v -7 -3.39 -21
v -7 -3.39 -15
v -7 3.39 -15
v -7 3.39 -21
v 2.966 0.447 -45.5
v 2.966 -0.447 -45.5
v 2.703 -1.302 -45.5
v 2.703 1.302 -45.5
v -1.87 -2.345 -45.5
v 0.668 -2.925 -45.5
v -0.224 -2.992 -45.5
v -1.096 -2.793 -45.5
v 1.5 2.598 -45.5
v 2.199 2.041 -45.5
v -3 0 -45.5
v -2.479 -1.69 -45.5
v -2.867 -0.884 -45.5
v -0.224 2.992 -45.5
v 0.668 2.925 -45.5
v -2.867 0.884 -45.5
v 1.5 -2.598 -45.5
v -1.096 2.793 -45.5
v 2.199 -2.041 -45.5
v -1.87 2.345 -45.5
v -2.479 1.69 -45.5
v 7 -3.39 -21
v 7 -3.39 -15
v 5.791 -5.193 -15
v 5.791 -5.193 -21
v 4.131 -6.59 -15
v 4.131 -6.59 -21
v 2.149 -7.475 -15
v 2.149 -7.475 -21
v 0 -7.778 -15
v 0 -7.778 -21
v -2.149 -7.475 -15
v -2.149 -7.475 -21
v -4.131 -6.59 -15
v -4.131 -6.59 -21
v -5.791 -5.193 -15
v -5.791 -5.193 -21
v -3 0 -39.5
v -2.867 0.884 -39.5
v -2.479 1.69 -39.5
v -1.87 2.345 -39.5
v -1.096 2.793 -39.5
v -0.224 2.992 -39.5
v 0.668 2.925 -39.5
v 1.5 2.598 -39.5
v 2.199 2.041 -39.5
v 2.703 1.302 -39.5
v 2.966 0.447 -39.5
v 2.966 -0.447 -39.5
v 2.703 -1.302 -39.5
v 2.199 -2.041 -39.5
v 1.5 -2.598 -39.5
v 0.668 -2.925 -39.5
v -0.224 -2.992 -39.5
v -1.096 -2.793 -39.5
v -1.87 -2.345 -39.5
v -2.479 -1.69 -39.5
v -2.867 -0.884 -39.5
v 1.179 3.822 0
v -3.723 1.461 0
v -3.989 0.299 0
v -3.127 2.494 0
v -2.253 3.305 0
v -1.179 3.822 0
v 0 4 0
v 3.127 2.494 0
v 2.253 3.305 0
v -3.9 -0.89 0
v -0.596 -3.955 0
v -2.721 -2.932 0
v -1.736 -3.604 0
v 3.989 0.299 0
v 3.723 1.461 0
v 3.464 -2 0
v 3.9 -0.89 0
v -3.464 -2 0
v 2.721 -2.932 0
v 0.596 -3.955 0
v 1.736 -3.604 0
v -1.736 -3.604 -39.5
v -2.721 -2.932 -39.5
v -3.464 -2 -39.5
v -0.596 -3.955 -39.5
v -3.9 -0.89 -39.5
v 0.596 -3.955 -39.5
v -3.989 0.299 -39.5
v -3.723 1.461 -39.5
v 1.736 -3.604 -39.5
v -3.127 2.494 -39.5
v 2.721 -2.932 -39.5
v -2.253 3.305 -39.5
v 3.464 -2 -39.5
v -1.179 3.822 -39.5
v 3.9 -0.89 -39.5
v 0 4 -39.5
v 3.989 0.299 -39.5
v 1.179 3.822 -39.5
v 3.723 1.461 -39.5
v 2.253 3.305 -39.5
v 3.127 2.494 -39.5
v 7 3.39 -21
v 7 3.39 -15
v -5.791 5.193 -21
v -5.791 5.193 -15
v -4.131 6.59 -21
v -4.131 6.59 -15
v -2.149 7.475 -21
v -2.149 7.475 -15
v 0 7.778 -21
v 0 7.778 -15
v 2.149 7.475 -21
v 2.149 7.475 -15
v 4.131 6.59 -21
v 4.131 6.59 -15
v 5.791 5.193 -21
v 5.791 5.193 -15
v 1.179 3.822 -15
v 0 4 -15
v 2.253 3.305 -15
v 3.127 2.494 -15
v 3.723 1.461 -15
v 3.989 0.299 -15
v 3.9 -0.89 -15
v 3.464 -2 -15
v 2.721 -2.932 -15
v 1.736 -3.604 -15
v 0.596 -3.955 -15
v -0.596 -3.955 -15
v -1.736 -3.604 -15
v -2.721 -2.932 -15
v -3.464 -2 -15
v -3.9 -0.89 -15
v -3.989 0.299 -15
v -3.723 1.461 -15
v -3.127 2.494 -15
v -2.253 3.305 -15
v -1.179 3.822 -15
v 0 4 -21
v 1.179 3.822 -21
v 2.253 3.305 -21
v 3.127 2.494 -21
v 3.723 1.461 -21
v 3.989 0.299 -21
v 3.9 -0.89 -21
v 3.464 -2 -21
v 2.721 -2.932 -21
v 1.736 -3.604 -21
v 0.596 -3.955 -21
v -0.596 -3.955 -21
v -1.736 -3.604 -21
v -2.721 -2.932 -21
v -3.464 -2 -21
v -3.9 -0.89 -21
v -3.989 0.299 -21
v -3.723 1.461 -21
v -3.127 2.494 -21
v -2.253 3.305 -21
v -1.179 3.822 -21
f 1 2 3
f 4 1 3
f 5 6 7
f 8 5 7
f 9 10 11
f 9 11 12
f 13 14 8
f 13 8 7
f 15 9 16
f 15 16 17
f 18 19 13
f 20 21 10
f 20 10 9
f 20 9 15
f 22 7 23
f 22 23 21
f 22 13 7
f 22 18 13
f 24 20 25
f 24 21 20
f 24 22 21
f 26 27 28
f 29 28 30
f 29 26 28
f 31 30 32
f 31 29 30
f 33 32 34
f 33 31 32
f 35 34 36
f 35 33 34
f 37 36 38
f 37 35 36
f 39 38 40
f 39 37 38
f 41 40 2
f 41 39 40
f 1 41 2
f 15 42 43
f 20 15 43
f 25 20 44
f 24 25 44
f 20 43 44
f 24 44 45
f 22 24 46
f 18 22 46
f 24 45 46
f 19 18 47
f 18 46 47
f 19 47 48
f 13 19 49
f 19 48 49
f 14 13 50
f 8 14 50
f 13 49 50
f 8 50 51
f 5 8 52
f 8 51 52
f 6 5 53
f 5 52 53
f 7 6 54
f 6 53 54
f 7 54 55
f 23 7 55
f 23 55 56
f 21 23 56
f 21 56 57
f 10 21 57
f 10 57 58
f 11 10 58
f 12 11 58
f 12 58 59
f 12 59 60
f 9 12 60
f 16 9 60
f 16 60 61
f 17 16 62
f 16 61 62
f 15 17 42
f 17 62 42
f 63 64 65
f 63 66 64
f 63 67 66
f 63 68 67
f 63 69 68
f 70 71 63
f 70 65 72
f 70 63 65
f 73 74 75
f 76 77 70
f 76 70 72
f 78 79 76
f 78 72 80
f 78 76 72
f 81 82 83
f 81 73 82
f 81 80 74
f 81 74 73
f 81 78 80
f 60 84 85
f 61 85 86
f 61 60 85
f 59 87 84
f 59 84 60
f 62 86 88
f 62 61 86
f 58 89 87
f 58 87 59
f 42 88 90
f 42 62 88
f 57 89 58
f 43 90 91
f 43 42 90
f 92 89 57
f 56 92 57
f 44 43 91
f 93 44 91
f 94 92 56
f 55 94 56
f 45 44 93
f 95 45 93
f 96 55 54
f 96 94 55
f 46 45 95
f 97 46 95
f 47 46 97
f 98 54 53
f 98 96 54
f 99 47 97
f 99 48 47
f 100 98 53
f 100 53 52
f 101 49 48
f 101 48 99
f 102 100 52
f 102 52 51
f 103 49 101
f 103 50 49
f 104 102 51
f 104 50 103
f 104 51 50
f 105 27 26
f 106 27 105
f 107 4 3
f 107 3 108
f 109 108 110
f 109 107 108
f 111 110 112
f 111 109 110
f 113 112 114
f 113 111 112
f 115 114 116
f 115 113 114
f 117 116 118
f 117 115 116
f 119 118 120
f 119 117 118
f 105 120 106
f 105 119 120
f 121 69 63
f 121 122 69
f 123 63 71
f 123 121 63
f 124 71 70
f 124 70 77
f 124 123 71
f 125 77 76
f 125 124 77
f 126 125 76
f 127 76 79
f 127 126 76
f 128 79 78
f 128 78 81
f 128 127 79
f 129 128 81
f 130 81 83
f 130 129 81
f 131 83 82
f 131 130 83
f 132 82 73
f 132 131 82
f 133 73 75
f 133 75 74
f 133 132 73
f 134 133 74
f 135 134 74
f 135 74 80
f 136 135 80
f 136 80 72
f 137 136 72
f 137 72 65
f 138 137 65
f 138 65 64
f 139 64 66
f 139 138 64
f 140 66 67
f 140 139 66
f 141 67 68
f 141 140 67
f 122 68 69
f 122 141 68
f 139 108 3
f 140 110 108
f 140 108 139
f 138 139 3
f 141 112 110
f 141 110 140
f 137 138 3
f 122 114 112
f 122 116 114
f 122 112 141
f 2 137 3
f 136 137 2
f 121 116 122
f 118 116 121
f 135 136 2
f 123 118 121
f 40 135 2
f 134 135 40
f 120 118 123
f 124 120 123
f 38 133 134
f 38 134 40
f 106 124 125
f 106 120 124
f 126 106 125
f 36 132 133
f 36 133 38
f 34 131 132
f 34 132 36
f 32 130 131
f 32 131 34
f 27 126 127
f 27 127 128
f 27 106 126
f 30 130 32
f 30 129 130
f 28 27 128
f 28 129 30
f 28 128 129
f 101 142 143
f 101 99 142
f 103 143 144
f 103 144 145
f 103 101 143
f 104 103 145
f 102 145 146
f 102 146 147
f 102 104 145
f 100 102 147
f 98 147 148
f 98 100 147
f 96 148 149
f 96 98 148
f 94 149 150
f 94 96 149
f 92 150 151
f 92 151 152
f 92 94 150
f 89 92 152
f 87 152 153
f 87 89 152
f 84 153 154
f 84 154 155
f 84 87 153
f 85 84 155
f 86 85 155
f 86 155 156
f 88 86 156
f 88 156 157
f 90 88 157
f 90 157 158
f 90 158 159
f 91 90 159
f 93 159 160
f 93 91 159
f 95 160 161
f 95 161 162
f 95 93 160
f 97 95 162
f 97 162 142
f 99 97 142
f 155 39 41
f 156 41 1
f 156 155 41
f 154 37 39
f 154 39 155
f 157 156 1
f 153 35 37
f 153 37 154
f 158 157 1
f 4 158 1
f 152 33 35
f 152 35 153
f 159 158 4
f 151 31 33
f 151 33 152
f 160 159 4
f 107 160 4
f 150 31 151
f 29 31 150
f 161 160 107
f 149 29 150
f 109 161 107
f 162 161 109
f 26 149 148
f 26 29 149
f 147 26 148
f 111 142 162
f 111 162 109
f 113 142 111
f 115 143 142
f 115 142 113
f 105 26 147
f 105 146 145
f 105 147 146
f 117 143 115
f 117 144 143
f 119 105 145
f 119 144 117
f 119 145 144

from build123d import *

# Parameters (mm, degrees)
SKETCH_3_W          = 8
SKETCH_3_H          = 16.823898374
CUT_EXTRUDE_1_DEPTH = 10
SKETCH_5_OUTSIDE_W  = 25.122
SKETCH_5_OUTSIDE_H  = 29.122
SKETCH_5_OUTSIDE_R  = 7.77784742
CUT_EXTRUDE_2_DEPTH = 10
SKETCH_6_R          = 3
EXTRUDE_1_DEPTH     = 6


with BuildPart() as part:
    # 草图2 → 旋转1 (revolve)
    with BuildSketch(Plane(origin=(0, 0, 0), x_dir=(0, 0, -1), z_dir=(1, 0, 0))):
        Polygon((0, 0), (0, 4), (15, 4), (15, 9), (21, 9), (21, 4), (39.5, 4), (39.5, 0), align=None)
    revolve(axis=Axis((0, 0, 0), (0, 0, -1)))

    # 草图3 → 切除-拉伸1 (cut)
    with BuildSketch(Plane.XY.offset(-15)):
        with Locations((-11, -0.026043186)):
            Rectangle(SKETCH_3_W, SKETCH_3_H)
        with Locations((11, -0.026043186)):
            Rectangle(SKETCH_3_W, SKETCH_3_H)
    extrude(amount=-CUT_EXTRUDE_1_DEPTH, mode=Mode.SUBTRACT)

    # 草图5 outside → 切除-拉伸2 (cut)
    with BuildSketch(Plane(origin=(0, 0, -21), x_dir=(-1, 0, 0), z_dir=(0, 0, -1))):
        Rectangle(SKETCH_5_OUTSIDE_W, SKETCH_5_OUTSIDE_H)
        Circle(SKETCH_5_OUTSIDE_R, mode=Mode.SUBTRACT)
    extrude(amount=-CUT_EXTRUDE_2_DEPTH, mode=Mode.SUBTRACT)

    # 草图6 → 凸台-拉伸1 (add)
    with BuildSketch(Plane(origin=(0, 0, -39.5), x_dir=(-1, 0, 0), z_dir=(0, 0, -1))):
        Circle(SKETCH_6_R)
    extrude(amount=EXTRUDE_1_DEPTH)


solid = part.part
